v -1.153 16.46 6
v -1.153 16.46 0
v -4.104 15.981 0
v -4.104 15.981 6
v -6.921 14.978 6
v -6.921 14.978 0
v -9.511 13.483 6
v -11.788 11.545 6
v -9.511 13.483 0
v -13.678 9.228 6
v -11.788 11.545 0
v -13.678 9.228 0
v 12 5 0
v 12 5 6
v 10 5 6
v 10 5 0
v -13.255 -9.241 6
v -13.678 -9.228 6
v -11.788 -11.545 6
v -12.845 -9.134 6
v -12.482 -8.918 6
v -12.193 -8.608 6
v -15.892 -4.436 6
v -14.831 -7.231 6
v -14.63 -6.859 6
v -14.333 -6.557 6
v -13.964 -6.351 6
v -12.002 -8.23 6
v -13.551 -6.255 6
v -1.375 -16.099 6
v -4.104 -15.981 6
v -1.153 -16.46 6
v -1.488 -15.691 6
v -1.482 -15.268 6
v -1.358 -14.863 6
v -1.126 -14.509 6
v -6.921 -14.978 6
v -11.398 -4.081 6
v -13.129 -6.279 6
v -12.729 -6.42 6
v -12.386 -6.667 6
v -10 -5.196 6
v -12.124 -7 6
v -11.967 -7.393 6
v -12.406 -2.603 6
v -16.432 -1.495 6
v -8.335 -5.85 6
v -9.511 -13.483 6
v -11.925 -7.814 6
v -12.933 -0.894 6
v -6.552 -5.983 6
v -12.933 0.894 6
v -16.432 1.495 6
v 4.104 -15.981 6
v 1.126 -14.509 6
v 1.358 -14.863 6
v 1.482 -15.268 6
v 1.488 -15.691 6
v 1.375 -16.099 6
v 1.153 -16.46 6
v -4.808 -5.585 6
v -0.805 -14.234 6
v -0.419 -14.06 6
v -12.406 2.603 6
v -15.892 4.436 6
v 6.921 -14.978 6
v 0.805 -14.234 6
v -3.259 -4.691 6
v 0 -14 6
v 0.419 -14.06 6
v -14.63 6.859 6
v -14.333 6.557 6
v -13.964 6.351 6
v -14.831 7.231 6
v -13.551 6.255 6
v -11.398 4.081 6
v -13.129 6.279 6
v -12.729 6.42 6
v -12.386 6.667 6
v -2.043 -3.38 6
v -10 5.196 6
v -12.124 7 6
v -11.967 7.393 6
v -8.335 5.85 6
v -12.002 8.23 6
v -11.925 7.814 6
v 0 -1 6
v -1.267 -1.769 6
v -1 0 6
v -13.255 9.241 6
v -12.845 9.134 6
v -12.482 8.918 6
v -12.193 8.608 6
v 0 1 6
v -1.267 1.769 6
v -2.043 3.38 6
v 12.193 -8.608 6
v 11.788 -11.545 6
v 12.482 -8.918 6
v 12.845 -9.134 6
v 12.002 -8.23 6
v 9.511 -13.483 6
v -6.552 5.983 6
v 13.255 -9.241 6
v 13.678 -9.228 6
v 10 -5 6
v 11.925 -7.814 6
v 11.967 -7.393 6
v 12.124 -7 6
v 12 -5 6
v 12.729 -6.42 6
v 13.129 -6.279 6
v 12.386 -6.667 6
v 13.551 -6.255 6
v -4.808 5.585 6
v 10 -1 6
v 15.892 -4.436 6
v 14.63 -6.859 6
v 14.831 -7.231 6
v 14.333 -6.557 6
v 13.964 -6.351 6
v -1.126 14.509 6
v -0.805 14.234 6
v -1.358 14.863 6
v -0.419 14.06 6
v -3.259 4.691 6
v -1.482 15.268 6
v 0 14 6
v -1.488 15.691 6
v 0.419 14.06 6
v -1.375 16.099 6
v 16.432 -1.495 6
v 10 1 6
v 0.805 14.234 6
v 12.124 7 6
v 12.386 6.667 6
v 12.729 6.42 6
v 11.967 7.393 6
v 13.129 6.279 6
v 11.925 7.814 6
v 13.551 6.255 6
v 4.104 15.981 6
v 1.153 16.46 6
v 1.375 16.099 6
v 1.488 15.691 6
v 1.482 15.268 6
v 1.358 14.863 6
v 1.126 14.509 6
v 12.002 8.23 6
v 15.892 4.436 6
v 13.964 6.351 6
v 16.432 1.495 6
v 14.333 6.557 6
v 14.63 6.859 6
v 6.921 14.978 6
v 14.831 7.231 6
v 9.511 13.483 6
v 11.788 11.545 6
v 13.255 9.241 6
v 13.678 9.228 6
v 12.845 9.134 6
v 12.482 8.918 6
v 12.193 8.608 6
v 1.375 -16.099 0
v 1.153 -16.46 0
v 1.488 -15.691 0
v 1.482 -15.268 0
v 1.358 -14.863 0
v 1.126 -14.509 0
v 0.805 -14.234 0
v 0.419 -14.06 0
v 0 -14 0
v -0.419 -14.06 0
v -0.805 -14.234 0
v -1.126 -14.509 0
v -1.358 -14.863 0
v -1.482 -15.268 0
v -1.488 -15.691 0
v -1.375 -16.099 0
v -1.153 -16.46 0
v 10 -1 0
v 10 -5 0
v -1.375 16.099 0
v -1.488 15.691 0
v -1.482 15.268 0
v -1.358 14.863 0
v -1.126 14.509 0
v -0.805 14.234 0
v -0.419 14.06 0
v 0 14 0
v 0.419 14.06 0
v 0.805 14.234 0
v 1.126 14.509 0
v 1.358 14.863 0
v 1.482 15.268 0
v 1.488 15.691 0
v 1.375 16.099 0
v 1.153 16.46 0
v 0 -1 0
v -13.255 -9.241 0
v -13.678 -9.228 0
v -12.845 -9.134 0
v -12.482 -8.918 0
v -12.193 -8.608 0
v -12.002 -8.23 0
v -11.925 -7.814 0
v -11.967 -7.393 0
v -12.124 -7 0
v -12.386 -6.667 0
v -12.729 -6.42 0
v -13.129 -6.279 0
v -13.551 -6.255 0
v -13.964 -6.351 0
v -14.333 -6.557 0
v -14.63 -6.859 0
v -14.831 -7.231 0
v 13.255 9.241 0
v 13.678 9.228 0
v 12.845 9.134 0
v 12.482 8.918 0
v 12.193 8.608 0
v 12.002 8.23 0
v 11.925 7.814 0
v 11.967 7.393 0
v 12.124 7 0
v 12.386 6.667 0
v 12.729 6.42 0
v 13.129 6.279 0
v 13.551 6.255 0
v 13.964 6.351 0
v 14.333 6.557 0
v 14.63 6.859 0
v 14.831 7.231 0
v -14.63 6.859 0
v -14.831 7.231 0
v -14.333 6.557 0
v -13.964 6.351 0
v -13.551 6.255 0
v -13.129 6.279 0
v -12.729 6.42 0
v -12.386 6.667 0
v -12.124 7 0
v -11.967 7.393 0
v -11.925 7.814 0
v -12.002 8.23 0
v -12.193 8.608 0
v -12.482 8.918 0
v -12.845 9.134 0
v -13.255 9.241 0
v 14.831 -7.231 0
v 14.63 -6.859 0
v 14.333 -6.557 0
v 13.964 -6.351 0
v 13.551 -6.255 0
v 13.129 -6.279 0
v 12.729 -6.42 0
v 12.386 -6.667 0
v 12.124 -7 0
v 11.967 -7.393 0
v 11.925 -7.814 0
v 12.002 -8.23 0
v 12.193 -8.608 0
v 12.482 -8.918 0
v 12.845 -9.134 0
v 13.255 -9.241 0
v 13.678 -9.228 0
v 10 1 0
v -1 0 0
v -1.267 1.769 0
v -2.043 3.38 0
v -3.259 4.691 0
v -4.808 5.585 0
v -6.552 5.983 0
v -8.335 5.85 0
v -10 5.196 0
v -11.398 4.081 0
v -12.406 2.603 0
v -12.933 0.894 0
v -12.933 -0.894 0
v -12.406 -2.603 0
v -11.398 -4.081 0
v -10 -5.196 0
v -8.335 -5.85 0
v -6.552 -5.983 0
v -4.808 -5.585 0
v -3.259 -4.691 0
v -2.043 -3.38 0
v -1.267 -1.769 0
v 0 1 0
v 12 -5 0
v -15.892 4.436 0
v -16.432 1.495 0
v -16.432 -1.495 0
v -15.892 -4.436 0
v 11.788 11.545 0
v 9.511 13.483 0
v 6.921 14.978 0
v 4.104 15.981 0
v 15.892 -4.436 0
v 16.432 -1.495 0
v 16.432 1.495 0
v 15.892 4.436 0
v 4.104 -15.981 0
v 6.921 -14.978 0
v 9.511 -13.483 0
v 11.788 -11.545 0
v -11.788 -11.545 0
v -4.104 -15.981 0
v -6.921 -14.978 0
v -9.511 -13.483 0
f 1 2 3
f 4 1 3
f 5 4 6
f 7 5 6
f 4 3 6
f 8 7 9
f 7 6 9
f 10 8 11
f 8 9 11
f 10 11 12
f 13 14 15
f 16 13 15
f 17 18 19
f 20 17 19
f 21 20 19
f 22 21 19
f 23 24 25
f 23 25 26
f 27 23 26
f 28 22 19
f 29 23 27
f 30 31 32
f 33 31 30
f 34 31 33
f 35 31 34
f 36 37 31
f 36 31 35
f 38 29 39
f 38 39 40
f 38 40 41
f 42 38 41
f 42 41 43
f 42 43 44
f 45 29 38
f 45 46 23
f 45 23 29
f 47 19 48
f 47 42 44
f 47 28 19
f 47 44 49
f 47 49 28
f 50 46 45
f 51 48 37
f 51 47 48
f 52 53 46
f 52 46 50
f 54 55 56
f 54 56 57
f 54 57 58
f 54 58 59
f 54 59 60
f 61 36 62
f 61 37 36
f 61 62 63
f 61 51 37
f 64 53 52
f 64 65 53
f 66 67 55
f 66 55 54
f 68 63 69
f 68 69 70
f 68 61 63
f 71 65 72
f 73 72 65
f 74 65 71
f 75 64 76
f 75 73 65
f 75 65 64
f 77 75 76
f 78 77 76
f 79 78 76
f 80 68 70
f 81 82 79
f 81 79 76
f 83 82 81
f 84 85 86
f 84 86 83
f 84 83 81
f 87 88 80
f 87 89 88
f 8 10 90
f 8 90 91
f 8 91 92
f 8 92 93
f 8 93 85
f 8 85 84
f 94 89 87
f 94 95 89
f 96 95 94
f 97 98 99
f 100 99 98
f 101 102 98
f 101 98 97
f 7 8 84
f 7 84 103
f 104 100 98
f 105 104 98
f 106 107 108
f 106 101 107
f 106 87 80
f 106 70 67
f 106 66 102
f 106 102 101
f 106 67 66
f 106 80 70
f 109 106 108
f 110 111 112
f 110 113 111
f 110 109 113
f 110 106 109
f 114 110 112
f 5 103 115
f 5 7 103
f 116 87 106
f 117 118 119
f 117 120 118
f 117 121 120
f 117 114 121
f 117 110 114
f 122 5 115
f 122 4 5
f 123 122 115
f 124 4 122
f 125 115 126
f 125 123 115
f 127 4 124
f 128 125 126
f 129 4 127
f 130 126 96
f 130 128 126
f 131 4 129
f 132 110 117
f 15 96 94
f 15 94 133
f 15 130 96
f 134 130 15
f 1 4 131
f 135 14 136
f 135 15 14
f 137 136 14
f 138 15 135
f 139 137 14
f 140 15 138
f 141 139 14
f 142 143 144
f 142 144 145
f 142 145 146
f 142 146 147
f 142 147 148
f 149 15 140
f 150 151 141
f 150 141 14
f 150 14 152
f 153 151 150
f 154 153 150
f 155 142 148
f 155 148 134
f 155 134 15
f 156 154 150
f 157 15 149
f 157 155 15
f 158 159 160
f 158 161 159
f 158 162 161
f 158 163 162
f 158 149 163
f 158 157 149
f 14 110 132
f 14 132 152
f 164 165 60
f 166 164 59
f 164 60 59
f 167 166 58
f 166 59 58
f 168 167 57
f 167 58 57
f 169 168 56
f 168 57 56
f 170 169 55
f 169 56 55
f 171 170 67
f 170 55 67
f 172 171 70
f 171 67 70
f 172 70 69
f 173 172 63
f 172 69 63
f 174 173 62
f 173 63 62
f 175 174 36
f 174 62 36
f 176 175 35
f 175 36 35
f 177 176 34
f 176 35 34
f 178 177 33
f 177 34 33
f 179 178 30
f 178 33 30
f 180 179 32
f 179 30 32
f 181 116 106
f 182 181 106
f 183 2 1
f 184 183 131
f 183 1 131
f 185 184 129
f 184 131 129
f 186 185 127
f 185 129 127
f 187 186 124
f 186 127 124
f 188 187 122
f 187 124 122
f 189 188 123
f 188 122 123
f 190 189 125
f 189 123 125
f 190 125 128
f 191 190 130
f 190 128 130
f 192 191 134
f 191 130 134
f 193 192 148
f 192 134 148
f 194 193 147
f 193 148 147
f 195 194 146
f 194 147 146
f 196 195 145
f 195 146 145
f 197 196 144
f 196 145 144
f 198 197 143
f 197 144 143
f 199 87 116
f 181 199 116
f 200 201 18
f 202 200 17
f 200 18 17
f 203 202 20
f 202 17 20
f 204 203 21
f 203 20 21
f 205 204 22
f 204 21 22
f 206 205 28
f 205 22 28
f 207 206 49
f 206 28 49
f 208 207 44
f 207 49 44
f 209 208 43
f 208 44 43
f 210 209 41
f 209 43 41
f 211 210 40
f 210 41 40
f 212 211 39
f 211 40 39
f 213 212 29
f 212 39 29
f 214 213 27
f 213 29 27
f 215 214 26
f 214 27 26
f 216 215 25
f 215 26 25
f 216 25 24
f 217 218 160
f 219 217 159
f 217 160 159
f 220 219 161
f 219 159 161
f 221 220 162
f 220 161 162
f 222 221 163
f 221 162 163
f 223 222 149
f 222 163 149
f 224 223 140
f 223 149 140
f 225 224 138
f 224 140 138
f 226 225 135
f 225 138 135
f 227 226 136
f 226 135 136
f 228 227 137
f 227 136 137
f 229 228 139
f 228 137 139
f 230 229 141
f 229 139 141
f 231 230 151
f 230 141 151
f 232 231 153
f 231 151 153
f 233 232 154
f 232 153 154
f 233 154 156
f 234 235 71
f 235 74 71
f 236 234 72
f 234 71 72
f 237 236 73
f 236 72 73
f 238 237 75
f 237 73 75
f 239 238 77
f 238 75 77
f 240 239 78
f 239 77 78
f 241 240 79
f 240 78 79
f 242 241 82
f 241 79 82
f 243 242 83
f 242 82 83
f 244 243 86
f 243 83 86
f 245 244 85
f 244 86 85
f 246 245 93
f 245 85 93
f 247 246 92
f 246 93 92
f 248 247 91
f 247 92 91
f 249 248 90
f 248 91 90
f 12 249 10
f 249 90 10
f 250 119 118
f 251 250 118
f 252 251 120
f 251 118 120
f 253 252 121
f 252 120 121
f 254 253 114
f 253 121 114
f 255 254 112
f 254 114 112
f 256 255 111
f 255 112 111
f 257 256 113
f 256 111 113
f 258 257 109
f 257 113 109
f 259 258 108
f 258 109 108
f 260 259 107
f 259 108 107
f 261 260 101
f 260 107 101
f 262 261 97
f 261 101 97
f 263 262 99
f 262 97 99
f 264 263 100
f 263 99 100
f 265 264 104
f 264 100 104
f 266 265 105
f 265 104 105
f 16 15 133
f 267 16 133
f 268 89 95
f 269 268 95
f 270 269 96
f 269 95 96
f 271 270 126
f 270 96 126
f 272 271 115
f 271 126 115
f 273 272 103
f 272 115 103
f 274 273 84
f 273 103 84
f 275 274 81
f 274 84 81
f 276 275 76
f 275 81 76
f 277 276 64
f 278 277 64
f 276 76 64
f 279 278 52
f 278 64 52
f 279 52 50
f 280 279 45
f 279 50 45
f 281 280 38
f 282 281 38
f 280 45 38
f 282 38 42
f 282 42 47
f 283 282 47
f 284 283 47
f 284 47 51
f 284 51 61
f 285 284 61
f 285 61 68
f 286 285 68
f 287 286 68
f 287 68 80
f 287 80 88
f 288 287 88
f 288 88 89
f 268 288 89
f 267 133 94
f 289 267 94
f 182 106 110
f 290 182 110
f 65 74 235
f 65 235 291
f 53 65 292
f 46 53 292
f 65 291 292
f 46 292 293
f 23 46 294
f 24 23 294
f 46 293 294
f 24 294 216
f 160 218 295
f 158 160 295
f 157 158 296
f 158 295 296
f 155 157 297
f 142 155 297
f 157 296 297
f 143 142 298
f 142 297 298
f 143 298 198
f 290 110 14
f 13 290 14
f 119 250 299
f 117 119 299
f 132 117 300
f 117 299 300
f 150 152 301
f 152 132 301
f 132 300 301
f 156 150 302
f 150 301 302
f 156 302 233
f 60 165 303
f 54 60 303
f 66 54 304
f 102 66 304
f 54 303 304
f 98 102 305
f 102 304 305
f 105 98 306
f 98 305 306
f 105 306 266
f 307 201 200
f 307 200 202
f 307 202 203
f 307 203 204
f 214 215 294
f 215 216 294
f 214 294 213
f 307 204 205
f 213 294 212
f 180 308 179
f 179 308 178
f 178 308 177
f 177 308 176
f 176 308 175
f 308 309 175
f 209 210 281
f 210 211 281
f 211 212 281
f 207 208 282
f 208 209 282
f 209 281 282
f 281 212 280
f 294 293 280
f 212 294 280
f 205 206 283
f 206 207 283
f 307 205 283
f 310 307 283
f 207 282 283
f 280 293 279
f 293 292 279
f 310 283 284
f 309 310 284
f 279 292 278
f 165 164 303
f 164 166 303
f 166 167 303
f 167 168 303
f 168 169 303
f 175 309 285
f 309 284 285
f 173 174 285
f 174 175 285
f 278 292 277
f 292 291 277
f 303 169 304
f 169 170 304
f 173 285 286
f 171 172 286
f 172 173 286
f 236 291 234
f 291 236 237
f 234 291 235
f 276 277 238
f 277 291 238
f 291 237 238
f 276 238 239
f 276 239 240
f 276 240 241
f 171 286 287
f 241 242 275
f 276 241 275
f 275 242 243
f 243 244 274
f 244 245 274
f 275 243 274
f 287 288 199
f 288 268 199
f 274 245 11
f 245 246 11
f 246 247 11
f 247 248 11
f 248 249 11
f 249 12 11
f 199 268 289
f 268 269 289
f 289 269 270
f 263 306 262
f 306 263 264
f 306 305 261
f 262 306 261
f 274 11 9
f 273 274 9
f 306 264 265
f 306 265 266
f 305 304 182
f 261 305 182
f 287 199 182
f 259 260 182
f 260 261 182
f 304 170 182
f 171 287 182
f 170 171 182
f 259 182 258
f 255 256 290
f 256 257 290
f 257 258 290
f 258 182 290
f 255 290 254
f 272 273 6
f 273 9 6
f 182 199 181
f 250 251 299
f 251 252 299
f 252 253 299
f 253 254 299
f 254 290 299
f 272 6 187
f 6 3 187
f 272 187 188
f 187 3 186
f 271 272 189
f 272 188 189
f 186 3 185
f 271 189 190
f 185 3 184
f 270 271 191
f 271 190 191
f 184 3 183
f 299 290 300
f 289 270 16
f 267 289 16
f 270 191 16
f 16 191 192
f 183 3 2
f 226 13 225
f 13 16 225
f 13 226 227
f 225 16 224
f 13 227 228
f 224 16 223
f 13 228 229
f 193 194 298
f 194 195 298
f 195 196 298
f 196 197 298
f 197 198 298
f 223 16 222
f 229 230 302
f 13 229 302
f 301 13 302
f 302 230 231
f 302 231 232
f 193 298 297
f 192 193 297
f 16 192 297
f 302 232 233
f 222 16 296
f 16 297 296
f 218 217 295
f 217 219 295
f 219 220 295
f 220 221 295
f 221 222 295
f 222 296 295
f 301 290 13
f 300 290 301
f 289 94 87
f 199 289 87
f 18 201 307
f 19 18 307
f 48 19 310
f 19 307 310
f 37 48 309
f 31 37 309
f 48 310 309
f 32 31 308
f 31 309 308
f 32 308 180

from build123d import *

# Parameters (mm, degrees)
SKETCH1_R           = 16.5
BOSS_EXTRUDE1_DEPTH = 6
SKETCH2_R           = 1.5
CUT_EXTRUDE1_DEPTH  = 25.093567606
SKETCH3_R           = 6
CUT_EXTRUDE2_DEPTH  = 25.065971427
CUT_EXTRUDE3_DEPTH  = 25.065971427


with BuildPart() as part:
    # Sketch1 → Boss-Extrude1 (new body)
    with BuildSketch(Plane.XY):
        Circle(SKETCH1_R)
    extrude(amount=BOSS_EXTRUDE1_DEPTH)

    # Sketch2 → Cut-Extrude1 (cut, through all)
    with BuildSketch(Plane.XY.offset(6)):
        with Locations((0, 15.5)):
            Circle(SKETCH2_R)
        with Locations((13.423393759, 7.75)):
            Circle(SKETCH2_R)
        with Locations((13.423393759, -7.75)):
            Circle(SKETCH2_R)
        with Locations((0, -15.5)):
            Circle(SKETCH2_R)
        with Locations((-13.423393759, -7.75)):
            Circle(SKETCH2_R)
        with Locations((-13.423393759, 7.75)):
            Circle(SKETCH2_R)
    extrude(amount=-CUT_EXTRUDE1_DEPTH, mode=Mode.SUBTRACT)

    # Sketch3 → Cut-Extrude2 (cut, through all)
    with BuildSketch(Plane.XY.offset(6)):
        with Locations((-7, 0)):
            Circle(SKETCH3_R)
    extrude(amount=-CUT_EXTRUDE2_DEPTH, mode=Mode.SUBTRACT)

    # Sketch5 → Cut-Extrude3 (cut, through all)
    with BuildSketch(Plane.XY.offset(6)):
        Polygon((12, 5), (10, 5), (10, 1), (0, 1), (0, -1), (10, -1), (10, -5), (12, -5), align=None)
    extrude(amount=-CUT_EXTRUDE3_DEPTH, mode=Mode.SUBTRACT)


solid = part.part
